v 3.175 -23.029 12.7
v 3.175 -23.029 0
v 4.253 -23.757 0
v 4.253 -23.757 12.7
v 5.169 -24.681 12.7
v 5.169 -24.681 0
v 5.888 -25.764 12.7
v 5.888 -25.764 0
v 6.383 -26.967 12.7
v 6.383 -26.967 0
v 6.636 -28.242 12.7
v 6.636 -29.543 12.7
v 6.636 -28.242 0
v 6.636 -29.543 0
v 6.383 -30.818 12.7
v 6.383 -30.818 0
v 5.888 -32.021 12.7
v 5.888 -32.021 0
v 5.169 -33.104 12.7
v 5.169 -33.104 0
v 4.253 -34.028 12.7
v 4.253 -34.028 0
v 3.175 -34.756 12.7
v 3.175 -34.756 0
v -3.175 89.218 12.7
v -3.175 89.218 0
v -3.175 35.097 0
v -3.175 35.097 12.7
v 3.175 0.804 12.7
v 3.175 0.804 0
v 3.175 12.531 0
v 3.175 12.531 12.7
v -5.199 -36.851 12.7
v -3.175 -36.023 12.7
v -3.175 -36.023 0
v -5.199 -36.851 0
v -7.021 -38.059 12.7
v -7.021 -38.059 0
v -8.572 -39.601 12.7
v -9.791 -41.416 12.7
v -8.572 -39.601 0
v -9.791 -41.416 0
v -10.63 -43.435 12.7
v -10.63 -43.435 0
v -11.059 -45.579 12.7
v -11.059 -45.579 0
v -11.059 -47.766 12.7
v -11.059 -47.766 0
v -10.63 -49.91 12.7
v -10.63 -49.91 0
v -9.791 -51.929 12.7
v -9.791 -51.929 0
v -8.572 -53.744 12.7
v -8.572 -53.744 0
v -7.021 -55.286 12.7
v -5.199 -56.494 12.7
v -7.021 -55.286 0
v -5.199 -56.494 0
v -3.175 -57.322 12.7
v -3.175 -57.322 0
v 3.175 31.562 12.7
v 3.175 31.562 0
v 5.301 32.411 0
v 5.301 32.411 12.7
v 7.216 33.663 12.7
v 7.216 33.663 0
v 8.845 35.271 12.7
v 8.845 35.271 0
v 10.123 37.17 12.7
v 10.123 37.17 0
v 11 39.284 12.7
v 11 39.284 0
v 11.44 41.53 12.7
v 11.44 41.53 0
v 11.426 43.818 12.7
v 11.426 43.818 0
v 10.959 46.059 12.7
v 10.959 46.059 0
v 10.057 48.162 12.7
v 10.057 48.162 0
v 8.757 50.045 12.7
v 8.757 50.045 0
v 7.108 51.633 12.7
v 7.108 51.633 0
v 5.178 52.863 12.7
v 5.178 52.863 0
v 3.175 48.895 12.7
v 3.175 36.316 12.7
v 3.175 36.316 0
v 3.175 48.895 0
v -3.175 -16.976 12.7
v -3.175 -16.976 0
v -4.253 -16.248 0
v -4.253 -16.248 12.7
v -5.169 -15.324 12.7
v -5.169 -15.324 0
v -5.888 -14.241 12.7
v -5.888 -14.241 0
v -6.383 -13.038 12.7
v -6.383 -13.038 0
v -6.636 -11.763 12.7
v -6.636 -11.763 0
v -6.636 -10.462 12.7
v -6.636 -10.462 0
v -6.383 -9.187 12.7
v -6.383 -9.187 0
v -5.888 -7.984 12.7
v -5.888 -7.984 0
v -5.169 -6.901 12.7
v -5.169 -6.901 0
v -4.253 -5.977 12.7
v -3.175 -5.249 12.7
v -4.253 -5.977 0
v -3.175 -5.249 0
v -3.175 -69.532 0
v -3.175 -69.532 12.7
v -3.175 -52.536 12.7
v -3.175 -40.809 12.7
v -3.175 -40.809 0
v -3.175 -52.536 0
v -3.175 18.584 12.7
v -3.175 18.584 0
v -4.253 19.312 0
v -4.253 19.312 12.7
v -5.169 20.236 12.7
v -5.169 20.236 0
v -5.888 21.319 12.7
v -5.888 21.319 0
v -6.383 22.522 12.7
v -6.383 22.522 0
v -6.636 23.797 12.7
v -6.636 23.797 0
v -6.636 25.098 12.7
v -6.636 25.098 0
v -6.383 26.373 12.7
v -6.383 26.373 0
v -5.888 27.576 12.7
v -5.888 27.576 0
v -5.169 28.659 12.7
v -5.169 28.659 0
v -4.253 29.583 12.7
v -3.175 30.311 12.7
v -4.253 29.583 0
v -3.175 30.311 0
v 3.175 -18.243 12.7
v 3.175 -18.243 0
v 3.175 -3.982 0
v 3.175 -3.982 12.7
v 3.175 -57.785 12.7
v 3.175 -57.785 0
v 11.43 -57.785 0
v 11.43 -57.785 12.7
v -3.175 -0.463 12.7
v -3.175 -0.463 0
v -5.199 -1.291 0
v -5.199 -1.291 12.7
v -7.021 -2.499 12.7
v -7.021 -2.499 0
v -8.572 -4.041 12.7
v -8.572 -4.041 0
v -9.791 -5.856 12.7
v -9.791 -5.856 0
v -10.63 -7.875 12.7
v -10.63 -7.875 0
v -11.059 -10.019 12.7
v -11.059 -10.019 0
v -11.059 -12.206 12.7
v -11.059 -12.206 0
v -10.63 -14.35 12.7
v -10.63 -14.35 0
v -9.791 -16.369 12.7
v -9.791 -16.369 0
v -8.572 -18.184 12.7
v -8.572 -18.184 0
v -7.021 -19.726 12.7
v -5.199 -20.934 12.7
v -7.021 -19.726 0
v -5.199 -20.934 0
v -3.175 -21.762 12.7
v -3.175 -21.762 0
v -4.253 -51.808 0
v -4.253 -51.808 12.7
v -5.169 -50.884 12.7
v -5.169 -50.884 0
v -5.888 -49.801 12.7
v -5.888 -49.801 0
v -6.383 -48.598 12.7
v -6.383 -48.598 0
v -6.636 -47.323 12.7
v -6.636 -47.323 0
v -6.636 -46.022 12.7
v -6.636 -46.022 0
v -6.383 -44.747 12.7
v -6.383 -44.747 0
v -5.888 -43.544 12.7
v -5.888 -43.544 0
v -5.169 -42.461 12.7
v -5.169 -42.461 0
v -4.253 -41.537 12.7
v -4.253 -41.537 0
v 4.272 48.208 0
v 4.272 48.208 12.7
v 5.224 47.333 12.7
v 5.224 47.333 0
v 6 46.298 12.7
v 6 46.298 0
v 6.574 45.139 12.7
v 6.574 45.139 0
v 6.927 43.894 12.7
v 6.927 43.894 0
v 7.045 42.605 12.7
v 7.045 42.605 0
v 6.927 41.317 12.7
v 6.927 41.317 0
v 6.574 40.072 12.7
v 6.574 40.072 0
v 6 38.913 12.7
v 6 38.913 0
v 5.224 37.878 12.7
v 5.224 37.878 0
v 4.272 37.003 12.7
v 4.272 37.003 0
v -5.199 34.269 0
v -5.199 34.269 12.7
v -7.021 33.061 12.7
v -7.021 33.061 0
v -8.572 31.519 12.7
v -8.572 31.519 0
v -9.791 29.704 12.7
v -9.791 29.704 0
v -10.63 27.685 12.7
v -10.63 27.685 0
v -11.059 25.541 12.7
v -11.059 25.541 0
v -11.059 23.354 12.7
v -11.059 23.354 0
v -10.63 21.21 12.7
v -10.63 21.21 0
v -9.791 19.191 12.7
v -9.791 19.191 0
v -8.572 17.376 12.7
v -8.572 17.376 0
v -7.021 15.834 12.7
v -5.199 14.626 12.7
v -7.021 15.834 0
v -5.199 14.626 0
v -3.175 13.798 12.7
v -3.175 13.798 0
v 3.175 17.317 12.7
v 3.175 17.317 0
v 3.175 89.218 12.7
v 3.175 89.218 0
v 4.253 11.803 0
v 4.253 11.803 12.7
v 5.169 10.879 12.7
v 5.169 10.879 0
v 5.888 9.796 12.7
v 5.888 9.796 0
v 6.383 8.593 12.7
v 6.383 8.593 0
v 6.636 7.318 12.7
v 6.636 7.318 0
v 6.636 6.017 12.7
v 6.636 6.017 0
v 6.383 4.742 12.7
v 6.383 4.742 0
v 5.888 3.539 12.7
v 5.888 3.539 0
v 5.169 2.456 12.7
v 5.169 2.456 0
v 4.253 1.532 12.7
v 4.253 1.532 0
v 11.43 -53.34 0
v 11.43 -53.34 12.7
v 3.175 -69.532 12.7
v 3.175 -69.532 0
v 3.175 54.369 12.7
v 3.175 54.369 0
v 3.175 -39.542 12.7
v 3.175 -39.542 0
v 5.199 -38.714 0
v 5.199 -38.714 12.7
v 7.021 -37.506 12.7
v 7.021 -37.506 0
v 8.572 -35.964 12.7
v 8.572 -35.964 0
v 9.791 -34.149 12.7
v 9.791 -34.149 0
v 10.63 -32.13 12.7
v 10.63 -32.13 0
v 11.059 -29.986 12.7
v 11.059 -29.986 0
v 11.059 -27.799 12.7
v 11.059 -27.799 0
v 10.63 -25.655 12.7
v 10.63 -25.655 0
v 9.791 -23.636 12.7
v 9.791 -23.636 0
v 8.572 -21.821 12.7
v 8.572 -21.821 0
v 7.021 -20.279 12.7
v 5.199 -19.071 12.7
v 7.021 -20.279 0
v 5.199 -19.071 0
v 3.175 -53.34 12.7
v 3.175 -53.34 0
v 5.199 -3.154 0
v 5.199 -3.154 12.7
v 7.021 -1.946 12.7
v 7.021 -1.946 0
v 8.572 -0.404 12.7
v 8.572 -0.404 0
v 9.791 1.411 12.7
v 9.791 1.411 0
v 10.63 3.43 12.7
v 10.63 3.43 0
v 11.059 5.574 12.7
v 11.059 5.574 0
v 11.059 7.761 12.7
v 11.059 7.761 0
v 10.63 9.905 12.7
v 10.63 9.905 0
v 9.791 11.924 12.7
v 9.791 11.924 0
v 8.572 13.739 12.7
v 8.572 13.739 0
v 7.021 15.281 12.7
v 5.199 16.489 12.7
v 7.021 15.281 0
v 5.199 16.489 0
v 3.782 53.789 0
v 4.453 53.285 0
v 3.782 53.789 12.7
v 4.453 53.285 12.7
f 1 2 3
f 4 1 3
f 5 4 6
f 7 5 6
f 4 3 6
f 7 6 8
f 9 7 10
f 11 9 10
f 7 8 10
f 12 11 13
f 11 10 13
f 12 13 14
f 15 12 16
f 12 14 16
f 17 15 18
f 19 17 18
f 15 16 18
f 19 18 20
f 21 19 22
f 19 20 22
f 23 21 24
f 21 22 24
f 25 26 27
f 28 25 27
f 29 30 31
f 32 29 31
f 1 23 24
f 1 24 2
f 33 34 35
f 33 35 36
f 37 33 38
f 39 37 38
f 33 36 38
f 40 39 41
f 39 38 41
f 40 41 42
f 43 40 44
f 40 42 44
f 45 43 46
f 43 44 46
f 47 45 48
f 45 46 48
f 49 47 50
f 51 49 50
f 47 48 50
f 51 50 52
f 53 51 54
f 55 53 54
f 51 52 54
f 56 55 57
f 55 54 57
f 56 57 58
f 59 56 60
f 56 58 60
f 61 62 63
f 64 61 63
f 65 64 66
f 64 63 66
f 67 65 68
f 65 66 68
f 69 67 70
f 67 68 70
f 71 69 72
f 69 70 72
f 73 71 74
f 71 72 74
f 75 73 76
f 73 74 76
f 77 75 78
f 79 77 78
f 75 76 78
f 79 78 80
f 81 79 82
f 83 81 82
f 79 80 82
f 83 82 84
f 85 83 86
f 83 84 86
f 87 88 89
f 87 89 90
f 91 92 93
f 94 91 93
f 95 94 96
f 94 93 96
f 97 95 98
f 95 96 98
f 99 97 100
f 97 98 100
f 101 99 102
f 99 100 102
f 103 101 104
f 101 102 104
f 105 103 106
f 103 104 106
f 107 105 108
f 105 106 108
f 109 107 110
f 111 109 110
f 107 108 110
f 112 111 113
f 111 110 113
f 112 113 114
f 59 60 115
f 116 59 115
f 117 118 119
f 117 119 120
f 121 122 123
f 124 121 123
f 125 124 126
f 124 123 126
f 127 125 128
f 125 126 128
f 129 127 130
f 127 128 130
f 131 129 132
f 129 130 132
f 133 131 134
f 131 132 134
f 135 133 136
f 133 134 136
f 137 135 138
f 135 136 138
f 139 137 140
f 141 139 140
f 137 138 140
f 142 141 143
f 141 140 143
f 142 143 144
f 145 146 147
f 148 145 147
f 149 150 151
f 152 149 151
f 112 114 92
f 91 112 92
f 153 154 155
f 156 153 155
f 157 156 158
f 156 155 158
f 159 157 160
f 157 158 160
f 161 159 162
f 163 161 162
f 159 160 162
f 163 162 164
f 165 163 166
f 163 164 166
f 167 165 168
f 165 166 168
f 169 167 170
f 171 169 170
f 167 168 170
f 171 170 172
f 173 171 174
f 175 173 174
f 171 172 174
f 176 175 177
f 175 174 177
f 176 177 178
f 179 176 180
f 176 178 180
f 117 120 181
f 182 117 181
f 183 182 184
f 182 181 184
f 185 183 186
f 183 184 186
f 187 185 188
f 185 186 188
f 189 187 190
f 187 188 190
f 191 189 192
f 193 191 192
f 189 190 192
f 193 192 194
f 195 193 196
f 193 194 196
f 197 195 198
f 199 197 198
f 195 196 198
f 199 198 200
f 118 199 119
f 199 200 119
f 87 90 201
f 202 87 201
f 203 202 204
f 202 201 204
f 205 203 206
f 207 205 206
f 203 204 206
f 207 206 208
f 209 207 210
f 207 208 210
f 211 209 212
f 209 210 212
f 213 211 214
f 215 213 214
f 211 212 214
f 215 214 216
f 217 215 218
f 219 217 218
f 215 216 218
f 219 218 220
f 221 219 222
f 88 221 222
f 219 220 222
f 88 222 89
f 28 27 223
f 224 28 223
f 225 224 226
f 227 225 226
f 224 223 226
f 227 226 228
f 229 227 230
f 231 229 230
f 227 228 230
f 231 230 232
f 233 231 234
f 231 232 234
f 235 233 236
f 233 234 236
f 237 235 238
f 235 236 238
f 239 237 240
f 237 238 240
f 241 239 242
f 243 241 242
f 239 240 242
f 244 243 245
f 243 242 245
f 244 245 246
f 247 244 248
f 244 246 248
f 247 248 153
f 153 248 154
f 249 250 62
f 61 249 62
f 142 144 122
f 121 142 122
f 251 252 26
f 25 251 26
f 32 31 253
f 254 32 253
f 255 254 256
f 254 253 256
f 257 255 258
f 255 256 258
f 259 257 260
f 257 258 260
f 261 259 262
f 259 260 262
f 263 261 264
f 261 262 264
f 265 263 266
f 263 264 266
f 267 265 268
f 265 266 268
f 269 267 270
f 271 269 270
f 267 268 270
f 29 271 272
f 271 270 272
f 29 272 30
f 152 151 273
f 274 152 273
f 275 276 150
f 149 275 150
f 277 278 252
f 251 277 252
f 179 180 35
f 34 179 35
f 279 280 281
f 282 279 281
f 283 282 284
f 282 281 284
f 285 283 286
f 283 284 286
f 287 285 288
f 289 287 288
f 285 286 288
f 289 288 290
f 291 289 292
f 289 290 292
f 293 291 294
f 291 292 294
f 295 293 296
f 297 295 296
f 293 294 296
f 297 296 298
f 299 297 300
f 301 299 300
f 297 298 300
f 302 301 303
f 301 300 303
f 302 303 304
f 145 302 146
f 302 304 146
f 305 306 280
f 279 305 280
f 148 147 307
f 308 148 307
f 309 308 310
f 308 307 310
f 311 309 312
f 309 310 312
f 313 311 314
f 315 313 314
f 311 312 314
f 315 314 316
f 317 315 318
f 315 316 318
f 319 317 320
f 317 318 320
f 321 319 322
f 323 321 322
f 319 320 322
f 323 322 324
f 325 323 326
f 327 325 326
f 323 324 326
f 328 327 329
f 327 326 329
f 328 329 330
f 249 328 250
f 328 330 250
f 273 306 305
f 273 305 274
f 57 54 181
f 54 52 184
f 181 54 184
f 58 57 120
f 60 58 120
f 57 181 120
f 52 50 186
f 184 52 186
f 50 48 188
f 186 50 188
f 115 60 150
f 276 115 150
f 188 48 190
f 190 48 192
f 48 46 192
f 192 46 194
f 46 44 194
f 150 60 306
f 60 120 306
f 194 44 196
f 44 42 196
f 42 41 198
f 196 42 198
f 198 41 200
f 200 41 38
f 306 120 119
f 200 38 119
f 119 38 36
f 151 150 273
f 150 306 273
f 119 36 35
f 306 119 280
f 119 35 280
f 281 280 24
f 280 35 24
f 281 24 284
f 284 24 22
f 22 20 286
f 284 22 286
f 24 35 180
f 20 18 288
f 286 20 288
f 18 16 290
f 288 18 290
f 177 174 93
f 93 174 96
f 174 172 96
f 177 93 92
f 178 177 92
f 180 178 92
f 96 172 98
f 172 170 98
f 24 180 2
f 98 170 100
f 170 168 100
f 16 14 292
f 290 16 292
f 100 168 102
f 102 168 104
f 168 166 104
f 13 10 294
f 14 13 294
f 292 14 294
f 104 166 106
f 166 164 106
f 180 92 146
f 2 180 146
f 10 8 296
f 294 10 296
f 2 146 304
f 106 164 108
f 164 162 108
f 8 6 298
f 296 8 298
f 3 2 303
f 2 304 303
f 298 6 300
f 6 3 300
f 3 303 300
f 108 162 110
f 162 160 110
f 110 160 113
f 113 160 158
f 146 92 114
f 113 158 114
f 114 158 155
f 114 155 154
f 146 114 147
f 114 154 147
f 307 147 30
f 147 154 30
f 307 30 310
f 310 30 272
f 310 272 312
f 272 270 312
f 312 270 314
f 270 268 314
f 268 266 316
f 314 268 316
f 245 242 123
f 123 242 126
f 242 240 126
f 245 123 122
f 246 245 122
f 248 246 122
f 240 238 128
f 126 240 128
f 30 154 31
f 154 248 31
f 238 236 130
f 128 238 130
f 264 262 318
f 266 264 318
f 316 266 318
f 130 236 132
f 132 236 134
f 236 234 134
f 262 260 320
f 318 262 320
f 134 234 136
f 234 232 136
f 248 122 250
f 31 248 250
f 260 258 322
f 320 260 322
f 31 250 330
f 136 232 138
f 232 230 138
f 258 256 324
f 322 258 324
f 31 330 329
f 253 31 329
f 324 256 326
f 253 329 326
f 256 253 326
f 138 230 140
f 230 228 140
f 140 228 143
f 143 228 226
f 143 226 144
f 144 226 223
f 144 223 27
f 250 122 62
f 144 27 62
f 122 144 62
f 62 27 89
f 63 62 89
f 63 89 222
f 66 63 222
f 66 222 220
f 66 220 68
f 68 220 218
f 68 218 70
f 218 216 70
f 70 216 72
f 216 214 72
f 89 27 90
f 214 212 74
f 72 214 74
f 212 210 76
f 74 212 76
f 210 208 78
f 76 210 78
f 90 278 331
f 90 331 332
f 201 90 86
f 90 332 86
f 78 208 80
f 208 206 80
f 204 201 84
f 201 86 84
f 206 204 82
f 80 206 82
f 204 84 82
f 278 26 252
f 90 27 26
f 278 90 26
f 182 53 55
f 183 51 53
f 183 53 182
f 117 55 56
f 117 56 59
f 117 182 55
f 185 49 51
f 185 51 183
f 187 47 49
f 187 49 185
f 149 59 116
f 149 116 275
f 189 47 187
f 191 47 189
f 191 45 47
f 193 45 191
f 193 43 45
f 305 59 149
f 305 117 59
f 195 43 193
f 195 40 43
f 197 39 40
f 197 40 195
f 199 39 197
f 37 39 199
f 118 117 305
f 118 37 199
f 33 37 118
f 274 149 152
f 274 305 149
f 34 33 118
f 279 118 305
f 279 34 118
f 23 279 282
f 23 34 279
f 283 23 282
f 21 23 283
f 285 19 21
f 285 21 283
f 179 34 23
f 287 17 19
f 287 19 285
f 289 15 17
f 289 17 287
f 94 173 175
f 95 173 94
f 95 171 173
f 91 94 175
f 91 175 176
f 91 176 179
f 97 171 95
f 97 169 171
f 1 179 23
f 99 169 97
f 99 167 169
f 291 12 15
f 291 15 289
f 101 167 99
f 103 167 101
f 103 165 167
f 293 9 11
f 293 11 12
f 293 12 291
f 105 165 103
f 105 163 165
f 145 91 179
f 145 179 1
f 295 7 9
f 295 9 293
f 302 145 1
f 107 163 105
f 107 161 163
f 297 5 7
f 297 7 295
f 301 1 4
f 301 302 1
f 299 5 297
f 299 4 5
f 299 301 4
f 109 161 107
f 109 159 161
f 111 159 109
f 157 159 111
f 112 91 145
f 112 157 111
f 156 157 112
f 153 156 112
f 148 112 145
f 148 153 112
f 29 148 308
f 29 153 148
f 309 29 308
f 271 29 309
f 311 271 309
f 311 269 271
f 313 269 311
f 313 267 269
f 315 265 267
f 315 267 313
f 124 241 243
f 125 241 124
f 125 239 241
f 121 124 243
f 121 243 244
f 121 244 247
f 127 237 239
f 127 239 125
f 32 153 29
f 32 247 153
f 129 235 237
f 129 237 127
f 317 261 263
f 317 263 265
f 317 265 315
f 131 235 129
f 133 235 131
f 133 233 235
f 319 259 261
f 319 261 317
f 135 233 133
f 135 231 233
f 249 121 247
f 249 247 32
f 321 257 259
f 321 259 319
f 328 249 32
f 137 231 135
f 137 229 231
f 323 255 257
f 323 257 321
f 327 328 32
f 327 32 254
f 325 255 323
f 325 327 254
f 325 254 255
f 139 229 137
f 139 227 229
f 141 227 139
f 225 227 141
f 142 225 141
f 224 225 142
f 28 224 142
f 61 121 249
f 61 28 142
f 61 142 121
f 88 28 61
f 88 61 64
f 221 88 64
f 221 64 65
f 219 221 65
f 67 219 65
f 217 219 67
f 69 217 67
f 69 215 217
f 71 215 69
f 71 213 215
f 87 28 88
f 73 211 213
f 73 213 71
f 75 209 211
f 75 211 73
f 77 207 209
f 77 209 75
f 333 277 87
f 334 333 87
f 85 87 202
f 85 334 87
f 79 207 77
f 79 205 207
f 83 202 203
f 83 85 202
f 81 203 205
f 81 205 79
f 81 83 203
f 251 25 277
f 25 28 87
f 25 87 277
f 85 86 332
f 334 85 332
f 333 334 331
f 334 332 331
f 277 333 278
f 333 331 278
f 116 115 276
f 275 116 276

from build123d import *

# Parameters (mm, degrees)
F0_W     = 8.255
F0_H     = 4.445
F1_DEPTH = 12.7


with BuildPart() as f1:
    # F0 (on Top) → F1 (new body)
    with BuildSketch(Plane.XY):
        with BuildLine():
            Line((3.175, 89.2175), (-3.175, 89.2175))
            Line((-3.175, 89.2175), (-3.175, 59.21375))
            ThreePointArc((-3.175, 59.21375), (-1.4603208006, 53.1557160458), (3.175, 48.895))
            Line((3.175, 48.895), (3.175, 54.3686230183))
            Line((3.175, 54.3686230183), (3.175, 89.2175))
        make_face()
        with BuildLine():
            ThreePointArc((3.175, 48.895), (-1.4603208006, 53.1557160458), (-3.175, 59.21375))
            Line((-3.175, 59.21375), (-3.175, 35.0967737428))
            ThreePointArc((-3.175, 35.0967737428), (-1.6043069816, 35.4435836373), (0, 35.56))
            ThreePointArc((0, 35.56), (1.6318769104, 35.751593167), (3.175, 36.315952381))
            Line((3.175, 36.315952381), (3.175, 48.895))
        make_face()
        with BuildLine():
            ThreePointArc((5.178111588, 52.8630686695), (4.1097442392, 53.5269543338), (3.175, 54.3686230183))
            Line((3.175, 54.3686230183), (3.175, 48.895))
            ThreePointArc((3.175, 48.895), (7.0454761905, 42.6054761905), (3.175, 36.315952381))
            Line((3.175, 36.315952381), (3.175, 31.5623598693))
            ThreePointArc((3.175, 31.5623598693), (11.4400029348, 41.5296621103), (5.178111588, 52.8630686695))
        make_face()
        with BuildLine():
            ThreePointArc((0, 35.56), (-1.6043069816, 35.4435836373), (-3.175, 35.0967737428))
            Line((-3.175, 35.0967737428), (-3.175, 30.3105138368))
            ThreePointArc((-3.175, 30.3105138368), (-1.6376677767, 30.9107499954), (0, 31.115))
            ThreePointArc((0, 31.115), (1.6031808891, 31.2273896149), (3.175, 31.5623598693))
            Line((3.175, 31.5623598693), (3.175, 36.315952381))
            ThreePointArc((3.175, 36.315952381), (1.6318769104, 35.751593167), (0, 35.56))
        make_face()
        with BuildLine():
            Line((-3.175, 30.3105138368), (-3.175, 35.0967737428))
            ThreePointArc((-3.175, 35.0967737428), (-11.1125, 24.4475), (-3.175, 13.7982262572))
            Line((-3.175, 13.7982262572), (-3.175, 18.5844861632))
            ThreePointArc((-3.175, 18.5844861632), (-6.6675, 24.4475), (-3.175, 30.3105138368))
        make_face()
        with BuildLine():
            ThreePointArc((0, 31.115), (-1.6376677767, 30.9107499954), (-3.175, 30.3105138368))
            Line((-3.175, 30.3105138368), (-3.175, 18.5844861632))
            ThreePointArc((-3.175, 18.5844861632), (-1.6376677767, 17.9842500046), (0, 17.78))
            ThreePointArc((0, 17.78), (1.6043069816, 17.6635836373), (3.175, 17.3167737428))
            Line((3.175, 17.3167737428), (3.175, 31.5623598693))
            ThreePointArc((3.175, 31.5623598693), (1.6031808891, 31.2273896149), (0, 31.115))
        make_face()
        with BuildLine():
            ThreePointArc((0, 13.335), (-1.6043069816, 13.4514163627), (-3.175, 13.7982262572))
            Line((-3.175, 13.7982262572), (-3.175, -0.4632262572))
            ThreePointArc((-3.175, -0.4632262572), (-1.6043069816, -0.1164163627), (0, 0))
            ThreePointArc((0, 0), (1.6376677767, 0.2042500046), (3.175, 0.8044861632))
            Line((3.175, 0.8044861632), (3.175, 12.5305138368))
            ThreePointArc((3.175, 12.5305138368), (1.6376677767, 13.1307499954), (0, 13.335))
        make_face()
        with BuildLine():
            Line((-3.175, 18.5844861632), (-3.175, 13.7982262572))
            ThreePointArc((-3.175, 13.7982262572), (-1.6043069816, 13.4514163627), (0, 13.335))
            ThreePointArc((0, 13.335), (1.6376677767, 13.1307499954), (3.175, 12.5305138368))
            Line((3.175, 12.5305138368), (3.175, 17.3167737428))
            ThreePointArc((3.175, 17.3167737428), (1.6043069816, 17.6635836373), (0, 17.78))
            ThreePointArc((0, 17.78), (-1.6376677767, 17.9842500046), (-3.175, 18.5844861632))
        make_face()
        with BuildLine():
            ThreePointArc((0, 0), (-1.6043069816, -0.1164163627), (-3.175, -0.4632262572))
            Line((-3.175, -0.4632262572), (-3.175, -5.2494861632))
            ThreePointArc((-3.175, -5.2494861632), (-1.6376677767, -4.6492500046), (0, -4.445))
            ThreePointArc((0, -4.445), (1.6043069816, -4.3285836373), (3.175, -3.9817737428))
            Line((3.175, -3.9817737428), (3.175, 0.8044861632))
            ThreePointArc((3.175, 0.8044861632), (1.6376677767, 0.2042500046), (0, 0))
        make_face()
        with BuildLine():
            Line((-3.175, -5.2494861632), (-3.175, -0.4632262572))
            ThreePointArc((-3.175, -0.4632262572), (-11.1125, -11.1125), (-3.175, -21.7617737428))
            Line((-3.175, -21.7617737428), (-3.175, -16.9755138368))
            ThreePointArc((-3.175, -16.9755138368), (-6.6675, -11.1125), (-3.175, -5.2494861632))
        make_face()
        with BuildLine():
            ThreePointArc((3.175, -3.9817737428), (11.1125, 6.6675), (3.175, 17.3167737428))
            Line((3.175, 17.3167737428), (3.175, 12.5305138368))
            ThreePointArc((3.175, 12.5305138368), (6.6675, 6.6675), (3.175, 0.8044861632))
            Line((3.175, 0.8044861632), (3.175, -3.9817737428))
        make_face()
        with BuildLine():
            ThreePointArc((0, -4.445), (-1.6376677767, -4.6492500046), (-3.175, -5.2494861632))
            Line((-3.175, -5.2494861632), (-3.175, -16.9755138368))
            ThreePointArc((-3.175, -16.9755138368), (-1.6376677767, -17.5757499954), (0, -17.78))
            ThreePointArc((0, -17.78), (1.6043069816, -17.8964163627), (3.175, -18.2432262572))
            Line((3.175, -18.2432262572), (3.175, -3.9817737428))
            ThreePointArc((3.175, -3.9817737428), (1.6043069816, -4.3285836373), (0, -4.445))
        make_face()
        with BuildLine():
            ThreePointArc((0, -22.225), (-1.6043069816, -22.1085836373), (-3.175, -21.7617737428))
            Line((-3.175, -21.7617737428), (-3.175, -36.0232262572))
            ThreePointArc((-3.175, -36.0232262572), (-1.6043069816, -35.6764163627), (0, -35.56))
            ThreePointArc((0, -35.56), (1.6376677767, -35.3557499954), (3.175, -34.7555138368))
            Line((3.175, -34.7555138368), (3.175, -23.0294861632))
            ThreePointArc((3.175, -23.0294861632), (1.6376677767, -22.4292500046), (0, -22.225))
        make_face()
        with BuildLine():
            Line((-3.175, -16.9755138368), (-3.175, -21.7617737428))
            ThreePointArc((-3.175, -21.7617737428), (-1.6043069816, -22.1085836373), (0, -22.225))
            ThreePointArc((0, -22.225), (1.6376677767, -22.4292500046), (3.175, -23.0294861632))
            Line((3.175, -23.0294861632), (3.175, -18.2432262572))
            ThreePointArc((3.175, -18.2432262572), (1.6043069816, -17.8964163627), (0, -17.78))
            ThreePointArc((0, -17.78), (-1.6376677767, -17.5757499954), (-3.175, -16.9755138368))
        make_face()
        with BuildLine():
            ThreePointArc((0, -35.56), (-1.6043069816, -35.6764163627), (-3.175, -36.0232262572))
            Line((-3.175, -36.0232262572), (-3.175, -40.8094861632))
            ThreePointArc((-3.175, -40.8094861632), (-1.6376677767, -40.2092500046), (0, -40.005))
            ThreePointArc((0, -40.005), (1.6043069816, -39.8885836373), (3.175, -39.5417737428))
            Line((3.175, -39.5417737428), (3.175, -34.7555138368))
            ThreePointArc((3.175, -34.7555138368), (1.6376677767, -35.3557499954), (0, -35.56))
        make_face()
        with BuildLine():
            Line((-3.175, -40.8094861632), (-3.175, -36.0232262572))
            ThreePointArc((-3.175, -36.0232262572), (-11.1125, -46.6725), (-3.175, -57.3217737428))
            Line((-3.175, -57.3217737428), (-3.175, -52.5355138368))
            ThreePointArc((-3.175, -52.5355138368), (-6.6675, -46.6725), (-3.175, -40.8094861632))
        make_face()
        with BuildLine():
            ThreePointArc((3.175, -39.5417737428), (11.1125, -28.8925), (3.175, -18.2432262572))
            Line((3.175, -18.2432262572), (3.175, -23.0294861632))
            ThreePointArc((3.175, -23.0294861632), (6.6675, -28.8925), (3.175, -34.7555138368))
            Line((3.175, -34.7555138368), (3.175, -39.5417737428))
        make_face()
        with BuildLine():
            ThreePointArc((0, -40.005), (-1.6376677767, -40.2092500046), (-3.175, -40.8094861632))
            Line((-3.175, -40.8094861632), (-3.175, -52.5355138368))
            ThreePointArc((-3.175, -52.5355138368), (-1.6376677767, -53.1357499954), (0, -53.34))
            Line((0, -53.34), (3.175, -53.34))
            Line((3.175, -53.34), (3.175, -39.5417737428))
            ThreePointArc((3.175, -39.5417737428), (1.6043069816, -39.8885836373), (0, -40.005))
        make_face()
        with BuildLine():
            ThreePointArc((0, -57.785), (-1.6043069816, -57.6685836373), (-3.175, -57.3217737428))
            Line((-3.175, -57.3217737428), (-3.175, -69.5325))
            Line((-3.175, -69.5325), (3.175, -69.5325))
            Line((3.175, -69.5325), (3.175, -57.785))
            Line((3.175, -57.785), (0, -57.785))
        make_face()
        with BuildLine():
            Line((-3.175, -52.5355138368), (-3.175, -57.3217737428))
            ThreePointArc((-3.175, -57.3217737428), (-1.6043069816, -57.6685836373), (0, -57.785))
            Line((0, -57.785), (3.175, -57.785))
            Line((3.175, -57.785), (3.175, -53.34))
            Line((3.175, -53.34), (0, -53.34))
            ThreePointArc((0, -53.34), (-1.6376677767, -53.1357499954), (-3.175, -52.5355138368))
        make_face()
        with Locations((7.3025, -55.5625)):
            Rectangle(F0_W, F0_H)
    extrude(amount=F1_DEPTH)


solid = f1.part
